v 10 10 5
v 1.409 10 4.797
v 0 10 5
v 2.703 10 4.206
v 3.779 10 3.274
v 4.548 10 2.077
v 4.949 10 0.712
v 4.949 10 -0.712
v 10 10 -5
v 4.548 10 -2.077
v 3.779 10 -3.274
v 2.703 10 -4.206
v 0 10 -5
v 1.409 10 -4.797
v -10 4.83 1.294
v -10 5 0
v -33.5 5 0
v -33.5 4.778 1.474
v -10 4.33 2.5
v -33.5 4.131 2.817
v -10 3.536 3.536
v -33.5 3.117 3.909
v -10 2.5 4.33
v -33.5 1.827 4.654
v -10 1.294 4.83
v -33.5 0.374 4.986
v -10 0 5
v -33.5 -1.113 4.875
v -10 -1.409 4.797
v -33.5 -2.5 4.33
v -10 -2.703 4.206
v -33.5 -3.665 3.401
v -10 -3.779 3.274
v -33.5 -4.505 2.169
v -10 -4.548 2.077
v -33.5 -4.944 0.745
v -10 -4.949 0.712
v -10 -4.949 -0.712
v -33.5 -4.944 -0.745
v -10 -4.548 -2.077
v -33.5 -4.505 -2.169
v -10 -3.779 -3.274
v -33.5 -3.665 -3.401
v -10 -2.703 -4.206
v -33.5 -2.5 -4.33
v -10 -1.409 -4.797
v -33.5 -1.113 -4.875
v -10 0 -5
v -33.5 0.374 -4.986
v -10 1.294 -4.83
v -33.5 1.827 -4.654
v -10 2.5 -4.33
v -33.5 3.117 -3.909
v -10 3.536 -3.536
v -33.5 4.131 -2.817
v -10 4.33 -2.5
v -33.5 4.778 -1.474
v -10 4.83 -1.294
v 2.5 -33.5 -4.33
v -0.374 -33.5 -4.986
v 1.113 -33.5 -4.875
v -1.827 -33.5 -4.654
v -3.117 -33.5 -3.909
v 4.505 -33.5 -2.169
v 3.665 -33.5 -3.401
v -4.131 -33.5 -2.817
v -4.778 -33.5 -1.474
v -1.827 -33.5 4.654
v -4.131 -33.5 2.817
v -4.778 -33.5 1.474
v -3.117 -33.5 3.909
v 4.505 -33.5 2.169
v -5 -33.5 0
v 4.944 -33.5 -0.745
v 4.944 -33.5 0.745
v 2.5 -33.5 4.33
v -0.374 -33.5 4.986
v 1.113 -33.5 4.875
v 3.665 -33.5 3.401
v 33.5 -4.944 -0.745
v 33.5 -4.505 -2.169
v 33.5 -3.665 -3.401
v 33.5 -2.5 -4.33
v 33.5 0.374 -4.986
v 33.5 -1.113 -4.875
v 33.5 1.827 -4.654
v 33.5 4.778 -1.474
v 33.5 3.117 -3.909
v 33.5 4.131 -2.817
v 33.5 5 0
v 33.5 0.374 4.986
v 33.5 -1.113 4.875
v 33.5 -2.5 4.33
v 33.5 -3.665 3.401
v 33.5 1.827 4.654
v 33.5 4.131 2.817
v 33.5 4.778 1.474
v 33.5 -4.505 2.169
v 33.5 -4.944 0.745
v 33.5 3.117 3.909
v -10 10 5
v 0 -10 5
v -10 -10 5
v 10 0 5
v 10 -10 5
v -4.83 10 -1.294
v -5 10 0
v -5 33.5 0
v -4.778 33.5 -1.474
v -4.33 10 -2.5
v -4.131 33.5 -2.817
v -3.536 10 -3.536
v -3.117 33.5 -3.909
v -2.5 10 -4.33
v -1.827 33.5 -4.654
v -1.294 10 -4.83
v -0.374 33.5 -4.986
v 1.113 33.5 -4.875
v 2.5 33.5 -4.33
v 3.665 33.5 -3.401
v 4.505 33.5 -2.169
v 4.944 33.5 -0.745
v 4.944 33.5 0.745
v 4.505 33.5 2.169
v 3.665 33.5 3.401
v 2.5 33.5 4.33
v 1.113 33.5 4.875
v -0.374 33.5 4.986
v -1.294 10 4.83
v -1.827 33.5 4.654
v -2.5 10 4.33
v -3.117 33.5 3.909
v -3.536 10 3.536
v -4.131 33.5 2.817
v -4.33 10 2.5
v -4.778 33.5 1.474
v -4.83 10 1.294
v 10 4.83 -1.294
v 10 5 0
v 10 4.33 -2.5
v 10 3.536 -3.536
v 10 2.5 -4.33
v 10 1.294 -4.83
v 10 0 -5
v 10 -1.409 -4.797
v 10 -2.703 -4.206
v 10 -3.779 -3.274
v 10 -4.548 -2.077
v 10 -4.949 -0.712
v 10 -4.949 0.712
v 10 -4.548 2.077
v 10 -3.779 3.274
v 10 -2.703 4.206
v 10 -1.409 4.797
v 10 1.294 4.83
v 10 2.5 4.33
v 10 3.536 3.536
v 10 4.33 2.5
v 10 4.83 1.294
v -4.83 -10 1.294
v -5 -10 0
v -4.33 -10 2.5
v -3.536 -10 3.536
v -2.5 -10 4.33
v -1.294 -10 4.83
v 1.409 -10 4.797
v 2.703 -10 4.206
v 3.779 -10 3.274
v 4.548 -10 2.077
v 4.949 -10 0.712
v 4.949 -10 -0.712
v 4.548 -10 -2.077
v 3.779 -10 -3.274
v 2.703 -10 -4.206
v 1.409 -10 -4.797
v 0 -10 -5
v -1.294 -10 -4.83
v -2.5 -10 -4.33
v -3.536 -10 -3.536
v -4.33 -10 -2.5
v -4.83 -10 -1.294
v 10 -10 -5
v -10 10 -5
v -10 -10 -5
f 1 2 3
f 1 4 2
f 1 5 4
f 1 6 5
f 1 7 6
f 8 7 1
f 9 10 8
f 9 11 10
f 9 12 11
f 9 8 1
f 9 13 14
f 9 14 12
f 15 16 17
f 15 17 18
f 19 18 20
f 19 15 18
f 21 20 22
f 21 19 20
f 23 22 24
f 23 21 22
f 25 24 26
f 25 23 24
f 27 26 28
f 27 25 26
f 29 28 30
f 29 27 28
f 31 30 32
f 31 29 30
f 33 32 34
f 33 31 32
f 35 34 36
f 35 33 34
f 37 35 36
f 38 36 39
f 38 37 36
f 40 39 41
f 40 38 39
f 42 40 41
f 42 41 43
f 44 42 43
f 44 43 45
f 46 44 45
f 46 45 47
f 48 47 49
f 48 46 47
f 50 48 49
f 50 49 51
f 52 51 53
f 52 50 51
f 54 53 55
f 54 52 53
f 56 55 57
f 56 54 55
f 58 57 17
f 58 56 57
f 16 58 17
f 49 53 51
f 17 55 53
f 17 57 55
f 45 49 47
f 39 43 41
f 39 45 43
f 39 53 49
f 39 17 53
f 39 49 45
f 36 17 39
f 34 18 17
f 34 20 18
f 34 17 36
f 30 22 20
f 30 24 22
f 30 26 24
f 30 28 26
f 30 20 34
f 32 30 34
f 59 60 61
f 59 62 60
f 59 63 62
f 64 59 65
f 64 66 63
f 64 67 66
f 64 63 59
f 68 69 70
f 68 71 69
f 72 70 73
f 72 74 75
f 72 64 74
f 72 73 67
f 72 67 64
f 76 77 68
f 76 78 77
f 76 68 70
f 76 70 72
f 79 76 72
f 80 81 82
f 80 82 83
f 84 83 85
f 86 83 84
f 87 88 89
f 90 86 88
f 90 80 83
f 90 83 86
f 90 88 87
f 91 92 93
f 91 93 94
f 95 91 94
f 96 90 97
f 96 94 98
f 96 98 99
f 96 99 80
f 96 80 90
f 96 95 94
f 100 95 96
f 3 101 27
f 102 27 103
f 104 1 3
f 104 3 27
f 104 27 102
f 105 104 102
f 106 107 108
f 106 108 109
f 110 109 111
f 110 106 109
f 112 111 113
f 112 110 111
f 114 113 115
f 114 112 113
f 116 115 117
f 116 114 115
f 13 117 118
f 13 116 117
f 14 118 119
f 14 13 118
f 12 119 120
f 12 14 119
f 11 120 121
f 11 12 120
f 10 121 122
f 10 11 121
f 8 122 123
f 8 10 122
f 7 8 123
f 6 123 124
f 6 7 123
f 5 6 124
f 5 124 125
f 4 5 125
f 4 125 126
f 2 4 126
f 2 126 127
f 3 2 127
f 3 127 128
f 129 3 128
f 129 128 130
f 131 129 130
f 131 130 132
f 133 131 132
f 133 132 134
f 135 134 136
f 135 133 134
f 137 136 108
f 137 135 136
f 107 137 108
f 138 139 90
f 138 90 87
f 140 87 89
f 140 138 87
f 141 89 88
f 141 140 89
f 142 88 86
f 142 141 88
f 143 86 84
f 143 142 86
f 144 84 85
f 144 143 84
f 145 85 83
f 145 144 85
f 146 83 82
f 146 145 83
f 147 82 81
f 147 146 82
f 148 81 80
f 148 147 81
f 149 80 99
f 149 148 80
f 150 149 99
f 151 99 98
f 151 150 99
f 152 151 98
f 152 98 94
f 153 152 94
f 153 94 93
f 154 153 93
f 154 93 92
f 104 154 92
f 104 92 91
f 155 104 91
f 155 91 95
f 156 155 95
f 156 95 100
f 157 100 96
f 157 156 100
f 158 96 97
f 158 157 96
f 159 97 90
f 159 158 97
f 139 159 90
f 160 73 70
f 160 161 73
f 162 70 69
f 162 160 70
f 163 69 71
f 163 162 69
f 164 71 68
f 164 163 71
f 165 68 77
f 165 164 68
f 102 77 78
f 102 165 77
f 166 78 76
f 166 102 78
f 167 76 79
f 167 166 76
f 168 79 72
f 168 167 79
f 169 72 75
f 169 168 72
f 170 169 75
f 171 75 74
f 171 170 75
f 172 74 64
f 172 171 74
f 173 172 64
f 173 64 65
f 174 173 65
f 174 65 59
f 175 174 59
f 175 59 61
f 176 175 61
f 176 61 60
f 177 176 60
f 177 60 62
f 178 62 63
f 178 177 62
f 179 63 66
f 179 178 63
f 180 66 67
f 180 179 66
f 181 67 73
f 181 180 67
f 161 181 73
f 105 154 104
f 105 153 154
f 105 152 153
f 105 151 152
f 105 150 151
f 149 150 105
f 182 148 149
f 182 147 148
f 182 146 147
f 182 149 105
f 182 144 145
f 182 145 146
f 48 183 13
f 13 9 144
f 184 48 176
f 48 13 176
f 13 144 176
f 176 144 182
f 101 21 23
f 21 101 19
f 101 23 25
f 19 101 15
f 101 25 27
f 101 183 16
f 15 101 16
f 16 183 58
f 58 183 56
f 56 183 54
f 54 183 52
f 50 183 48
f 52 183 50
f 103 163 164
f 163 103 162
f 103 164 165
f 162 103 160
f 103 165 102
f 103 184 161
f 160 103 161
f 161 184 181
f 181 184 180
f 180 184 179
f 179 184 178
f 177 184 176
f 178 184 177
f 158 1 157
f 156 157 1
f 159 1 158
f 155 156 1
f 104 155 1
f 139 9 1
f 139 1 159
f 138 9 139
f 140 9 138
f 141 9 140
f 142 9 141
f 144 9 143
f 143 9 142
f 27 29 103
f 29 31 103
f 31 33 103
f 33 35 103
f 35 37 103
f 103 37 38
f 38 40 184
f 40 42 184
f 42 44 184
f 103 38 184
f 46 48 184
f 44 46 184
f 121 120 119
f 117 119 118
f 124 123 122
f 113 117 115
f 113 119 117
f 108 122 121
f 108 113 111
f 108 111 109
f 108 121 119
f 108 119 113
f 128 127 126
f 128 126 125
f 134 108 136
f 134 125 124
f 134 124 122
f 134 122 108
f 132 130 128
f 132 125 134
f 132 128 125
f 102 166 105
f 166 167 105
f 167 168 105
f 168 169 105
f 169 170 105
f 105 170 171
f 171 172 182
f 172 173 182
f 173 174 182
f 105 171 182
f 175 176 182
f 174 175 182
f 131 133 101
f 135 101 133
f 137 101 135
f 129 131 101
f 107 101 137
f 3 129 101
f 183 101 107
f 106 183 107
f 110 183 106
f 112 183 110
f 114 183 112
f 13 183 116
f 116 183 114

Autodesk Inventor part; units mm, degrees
ref_plane "YZ Plane" through (0, 0, 0) normal (1, 0, 0) x (0, 1, 0)
ref_plane "XZ Plane" through (0, 0, 0) normal (0, 1, 0) x (-1, 0, 0)
ref_plane "XY Plane" through (0, 0, 0) normal (0, 0, 1) x (1, 0, 0)
sketch "Sketch1" plane through (0, 0, 0) normal (0, 1, 0) x (-1, 0, 0)
  line L0 (0, 0) -> (-10, 0) construction
  line L1 (-10, 0) -> (-10, -10)
  line L2 (-10, -10) -> (0, -10)
  line L3 (0, -10) -> (0, 0) construction
  line L4 (-10, 0) -> (-10, 10)
  line L5 (-10, 10) -> (0, 10)
  line L6 (10, 0) -> (10, -10)
  line L7 (10, -10) -> (0, -10)
  line L8 (10, 10) -> (0, 10)
  line L9 (10, 0) -> (10, 10)
  dimension "d0" = 10
extrude "Extrusion1" add sketch "Sketch1" along normal mid plane 10
sketch "Sketch2" plane through (-10, 5, 10) normal (0, 0, 1) x (1, 0, 0)
  circle A0 centre (10, -5) radius 5
  dimension "d4" = 10
extrude "Extrusion2" add sketch "Sketch2" along normal blind 23.5
mirror "Mirror1" about plane through (0, 0, 0) normal (0, 0, 1) of "Extrusion2"
sketch "Sketch3" plane through (10, -5, -10) normal (1, 0, 0) x (0, 0, -1)
  circle A0 centre (-10, 5) radius 5
  dimension "d8" = 10
extrude "Extrusion3" add sketch "Sketch3" along normal blind 23.5
mirror "Mirror2" about plane through (0, 0, 0) normal (1, 0, 0) of "Extrusion3"
move or copy body "Move Body1" bodies to move or copy 1 copy no rotation origin (0, 0, 0) rotation axis (1, 0, 0) rotation angle 90
move or copy body "Move Body2" bodies to move or copy 1 copy no rotation origin (0, 0, 0) rotation axis (0, 0, 1) rotation angle 90
properties part number "AnkRoll_v2"
